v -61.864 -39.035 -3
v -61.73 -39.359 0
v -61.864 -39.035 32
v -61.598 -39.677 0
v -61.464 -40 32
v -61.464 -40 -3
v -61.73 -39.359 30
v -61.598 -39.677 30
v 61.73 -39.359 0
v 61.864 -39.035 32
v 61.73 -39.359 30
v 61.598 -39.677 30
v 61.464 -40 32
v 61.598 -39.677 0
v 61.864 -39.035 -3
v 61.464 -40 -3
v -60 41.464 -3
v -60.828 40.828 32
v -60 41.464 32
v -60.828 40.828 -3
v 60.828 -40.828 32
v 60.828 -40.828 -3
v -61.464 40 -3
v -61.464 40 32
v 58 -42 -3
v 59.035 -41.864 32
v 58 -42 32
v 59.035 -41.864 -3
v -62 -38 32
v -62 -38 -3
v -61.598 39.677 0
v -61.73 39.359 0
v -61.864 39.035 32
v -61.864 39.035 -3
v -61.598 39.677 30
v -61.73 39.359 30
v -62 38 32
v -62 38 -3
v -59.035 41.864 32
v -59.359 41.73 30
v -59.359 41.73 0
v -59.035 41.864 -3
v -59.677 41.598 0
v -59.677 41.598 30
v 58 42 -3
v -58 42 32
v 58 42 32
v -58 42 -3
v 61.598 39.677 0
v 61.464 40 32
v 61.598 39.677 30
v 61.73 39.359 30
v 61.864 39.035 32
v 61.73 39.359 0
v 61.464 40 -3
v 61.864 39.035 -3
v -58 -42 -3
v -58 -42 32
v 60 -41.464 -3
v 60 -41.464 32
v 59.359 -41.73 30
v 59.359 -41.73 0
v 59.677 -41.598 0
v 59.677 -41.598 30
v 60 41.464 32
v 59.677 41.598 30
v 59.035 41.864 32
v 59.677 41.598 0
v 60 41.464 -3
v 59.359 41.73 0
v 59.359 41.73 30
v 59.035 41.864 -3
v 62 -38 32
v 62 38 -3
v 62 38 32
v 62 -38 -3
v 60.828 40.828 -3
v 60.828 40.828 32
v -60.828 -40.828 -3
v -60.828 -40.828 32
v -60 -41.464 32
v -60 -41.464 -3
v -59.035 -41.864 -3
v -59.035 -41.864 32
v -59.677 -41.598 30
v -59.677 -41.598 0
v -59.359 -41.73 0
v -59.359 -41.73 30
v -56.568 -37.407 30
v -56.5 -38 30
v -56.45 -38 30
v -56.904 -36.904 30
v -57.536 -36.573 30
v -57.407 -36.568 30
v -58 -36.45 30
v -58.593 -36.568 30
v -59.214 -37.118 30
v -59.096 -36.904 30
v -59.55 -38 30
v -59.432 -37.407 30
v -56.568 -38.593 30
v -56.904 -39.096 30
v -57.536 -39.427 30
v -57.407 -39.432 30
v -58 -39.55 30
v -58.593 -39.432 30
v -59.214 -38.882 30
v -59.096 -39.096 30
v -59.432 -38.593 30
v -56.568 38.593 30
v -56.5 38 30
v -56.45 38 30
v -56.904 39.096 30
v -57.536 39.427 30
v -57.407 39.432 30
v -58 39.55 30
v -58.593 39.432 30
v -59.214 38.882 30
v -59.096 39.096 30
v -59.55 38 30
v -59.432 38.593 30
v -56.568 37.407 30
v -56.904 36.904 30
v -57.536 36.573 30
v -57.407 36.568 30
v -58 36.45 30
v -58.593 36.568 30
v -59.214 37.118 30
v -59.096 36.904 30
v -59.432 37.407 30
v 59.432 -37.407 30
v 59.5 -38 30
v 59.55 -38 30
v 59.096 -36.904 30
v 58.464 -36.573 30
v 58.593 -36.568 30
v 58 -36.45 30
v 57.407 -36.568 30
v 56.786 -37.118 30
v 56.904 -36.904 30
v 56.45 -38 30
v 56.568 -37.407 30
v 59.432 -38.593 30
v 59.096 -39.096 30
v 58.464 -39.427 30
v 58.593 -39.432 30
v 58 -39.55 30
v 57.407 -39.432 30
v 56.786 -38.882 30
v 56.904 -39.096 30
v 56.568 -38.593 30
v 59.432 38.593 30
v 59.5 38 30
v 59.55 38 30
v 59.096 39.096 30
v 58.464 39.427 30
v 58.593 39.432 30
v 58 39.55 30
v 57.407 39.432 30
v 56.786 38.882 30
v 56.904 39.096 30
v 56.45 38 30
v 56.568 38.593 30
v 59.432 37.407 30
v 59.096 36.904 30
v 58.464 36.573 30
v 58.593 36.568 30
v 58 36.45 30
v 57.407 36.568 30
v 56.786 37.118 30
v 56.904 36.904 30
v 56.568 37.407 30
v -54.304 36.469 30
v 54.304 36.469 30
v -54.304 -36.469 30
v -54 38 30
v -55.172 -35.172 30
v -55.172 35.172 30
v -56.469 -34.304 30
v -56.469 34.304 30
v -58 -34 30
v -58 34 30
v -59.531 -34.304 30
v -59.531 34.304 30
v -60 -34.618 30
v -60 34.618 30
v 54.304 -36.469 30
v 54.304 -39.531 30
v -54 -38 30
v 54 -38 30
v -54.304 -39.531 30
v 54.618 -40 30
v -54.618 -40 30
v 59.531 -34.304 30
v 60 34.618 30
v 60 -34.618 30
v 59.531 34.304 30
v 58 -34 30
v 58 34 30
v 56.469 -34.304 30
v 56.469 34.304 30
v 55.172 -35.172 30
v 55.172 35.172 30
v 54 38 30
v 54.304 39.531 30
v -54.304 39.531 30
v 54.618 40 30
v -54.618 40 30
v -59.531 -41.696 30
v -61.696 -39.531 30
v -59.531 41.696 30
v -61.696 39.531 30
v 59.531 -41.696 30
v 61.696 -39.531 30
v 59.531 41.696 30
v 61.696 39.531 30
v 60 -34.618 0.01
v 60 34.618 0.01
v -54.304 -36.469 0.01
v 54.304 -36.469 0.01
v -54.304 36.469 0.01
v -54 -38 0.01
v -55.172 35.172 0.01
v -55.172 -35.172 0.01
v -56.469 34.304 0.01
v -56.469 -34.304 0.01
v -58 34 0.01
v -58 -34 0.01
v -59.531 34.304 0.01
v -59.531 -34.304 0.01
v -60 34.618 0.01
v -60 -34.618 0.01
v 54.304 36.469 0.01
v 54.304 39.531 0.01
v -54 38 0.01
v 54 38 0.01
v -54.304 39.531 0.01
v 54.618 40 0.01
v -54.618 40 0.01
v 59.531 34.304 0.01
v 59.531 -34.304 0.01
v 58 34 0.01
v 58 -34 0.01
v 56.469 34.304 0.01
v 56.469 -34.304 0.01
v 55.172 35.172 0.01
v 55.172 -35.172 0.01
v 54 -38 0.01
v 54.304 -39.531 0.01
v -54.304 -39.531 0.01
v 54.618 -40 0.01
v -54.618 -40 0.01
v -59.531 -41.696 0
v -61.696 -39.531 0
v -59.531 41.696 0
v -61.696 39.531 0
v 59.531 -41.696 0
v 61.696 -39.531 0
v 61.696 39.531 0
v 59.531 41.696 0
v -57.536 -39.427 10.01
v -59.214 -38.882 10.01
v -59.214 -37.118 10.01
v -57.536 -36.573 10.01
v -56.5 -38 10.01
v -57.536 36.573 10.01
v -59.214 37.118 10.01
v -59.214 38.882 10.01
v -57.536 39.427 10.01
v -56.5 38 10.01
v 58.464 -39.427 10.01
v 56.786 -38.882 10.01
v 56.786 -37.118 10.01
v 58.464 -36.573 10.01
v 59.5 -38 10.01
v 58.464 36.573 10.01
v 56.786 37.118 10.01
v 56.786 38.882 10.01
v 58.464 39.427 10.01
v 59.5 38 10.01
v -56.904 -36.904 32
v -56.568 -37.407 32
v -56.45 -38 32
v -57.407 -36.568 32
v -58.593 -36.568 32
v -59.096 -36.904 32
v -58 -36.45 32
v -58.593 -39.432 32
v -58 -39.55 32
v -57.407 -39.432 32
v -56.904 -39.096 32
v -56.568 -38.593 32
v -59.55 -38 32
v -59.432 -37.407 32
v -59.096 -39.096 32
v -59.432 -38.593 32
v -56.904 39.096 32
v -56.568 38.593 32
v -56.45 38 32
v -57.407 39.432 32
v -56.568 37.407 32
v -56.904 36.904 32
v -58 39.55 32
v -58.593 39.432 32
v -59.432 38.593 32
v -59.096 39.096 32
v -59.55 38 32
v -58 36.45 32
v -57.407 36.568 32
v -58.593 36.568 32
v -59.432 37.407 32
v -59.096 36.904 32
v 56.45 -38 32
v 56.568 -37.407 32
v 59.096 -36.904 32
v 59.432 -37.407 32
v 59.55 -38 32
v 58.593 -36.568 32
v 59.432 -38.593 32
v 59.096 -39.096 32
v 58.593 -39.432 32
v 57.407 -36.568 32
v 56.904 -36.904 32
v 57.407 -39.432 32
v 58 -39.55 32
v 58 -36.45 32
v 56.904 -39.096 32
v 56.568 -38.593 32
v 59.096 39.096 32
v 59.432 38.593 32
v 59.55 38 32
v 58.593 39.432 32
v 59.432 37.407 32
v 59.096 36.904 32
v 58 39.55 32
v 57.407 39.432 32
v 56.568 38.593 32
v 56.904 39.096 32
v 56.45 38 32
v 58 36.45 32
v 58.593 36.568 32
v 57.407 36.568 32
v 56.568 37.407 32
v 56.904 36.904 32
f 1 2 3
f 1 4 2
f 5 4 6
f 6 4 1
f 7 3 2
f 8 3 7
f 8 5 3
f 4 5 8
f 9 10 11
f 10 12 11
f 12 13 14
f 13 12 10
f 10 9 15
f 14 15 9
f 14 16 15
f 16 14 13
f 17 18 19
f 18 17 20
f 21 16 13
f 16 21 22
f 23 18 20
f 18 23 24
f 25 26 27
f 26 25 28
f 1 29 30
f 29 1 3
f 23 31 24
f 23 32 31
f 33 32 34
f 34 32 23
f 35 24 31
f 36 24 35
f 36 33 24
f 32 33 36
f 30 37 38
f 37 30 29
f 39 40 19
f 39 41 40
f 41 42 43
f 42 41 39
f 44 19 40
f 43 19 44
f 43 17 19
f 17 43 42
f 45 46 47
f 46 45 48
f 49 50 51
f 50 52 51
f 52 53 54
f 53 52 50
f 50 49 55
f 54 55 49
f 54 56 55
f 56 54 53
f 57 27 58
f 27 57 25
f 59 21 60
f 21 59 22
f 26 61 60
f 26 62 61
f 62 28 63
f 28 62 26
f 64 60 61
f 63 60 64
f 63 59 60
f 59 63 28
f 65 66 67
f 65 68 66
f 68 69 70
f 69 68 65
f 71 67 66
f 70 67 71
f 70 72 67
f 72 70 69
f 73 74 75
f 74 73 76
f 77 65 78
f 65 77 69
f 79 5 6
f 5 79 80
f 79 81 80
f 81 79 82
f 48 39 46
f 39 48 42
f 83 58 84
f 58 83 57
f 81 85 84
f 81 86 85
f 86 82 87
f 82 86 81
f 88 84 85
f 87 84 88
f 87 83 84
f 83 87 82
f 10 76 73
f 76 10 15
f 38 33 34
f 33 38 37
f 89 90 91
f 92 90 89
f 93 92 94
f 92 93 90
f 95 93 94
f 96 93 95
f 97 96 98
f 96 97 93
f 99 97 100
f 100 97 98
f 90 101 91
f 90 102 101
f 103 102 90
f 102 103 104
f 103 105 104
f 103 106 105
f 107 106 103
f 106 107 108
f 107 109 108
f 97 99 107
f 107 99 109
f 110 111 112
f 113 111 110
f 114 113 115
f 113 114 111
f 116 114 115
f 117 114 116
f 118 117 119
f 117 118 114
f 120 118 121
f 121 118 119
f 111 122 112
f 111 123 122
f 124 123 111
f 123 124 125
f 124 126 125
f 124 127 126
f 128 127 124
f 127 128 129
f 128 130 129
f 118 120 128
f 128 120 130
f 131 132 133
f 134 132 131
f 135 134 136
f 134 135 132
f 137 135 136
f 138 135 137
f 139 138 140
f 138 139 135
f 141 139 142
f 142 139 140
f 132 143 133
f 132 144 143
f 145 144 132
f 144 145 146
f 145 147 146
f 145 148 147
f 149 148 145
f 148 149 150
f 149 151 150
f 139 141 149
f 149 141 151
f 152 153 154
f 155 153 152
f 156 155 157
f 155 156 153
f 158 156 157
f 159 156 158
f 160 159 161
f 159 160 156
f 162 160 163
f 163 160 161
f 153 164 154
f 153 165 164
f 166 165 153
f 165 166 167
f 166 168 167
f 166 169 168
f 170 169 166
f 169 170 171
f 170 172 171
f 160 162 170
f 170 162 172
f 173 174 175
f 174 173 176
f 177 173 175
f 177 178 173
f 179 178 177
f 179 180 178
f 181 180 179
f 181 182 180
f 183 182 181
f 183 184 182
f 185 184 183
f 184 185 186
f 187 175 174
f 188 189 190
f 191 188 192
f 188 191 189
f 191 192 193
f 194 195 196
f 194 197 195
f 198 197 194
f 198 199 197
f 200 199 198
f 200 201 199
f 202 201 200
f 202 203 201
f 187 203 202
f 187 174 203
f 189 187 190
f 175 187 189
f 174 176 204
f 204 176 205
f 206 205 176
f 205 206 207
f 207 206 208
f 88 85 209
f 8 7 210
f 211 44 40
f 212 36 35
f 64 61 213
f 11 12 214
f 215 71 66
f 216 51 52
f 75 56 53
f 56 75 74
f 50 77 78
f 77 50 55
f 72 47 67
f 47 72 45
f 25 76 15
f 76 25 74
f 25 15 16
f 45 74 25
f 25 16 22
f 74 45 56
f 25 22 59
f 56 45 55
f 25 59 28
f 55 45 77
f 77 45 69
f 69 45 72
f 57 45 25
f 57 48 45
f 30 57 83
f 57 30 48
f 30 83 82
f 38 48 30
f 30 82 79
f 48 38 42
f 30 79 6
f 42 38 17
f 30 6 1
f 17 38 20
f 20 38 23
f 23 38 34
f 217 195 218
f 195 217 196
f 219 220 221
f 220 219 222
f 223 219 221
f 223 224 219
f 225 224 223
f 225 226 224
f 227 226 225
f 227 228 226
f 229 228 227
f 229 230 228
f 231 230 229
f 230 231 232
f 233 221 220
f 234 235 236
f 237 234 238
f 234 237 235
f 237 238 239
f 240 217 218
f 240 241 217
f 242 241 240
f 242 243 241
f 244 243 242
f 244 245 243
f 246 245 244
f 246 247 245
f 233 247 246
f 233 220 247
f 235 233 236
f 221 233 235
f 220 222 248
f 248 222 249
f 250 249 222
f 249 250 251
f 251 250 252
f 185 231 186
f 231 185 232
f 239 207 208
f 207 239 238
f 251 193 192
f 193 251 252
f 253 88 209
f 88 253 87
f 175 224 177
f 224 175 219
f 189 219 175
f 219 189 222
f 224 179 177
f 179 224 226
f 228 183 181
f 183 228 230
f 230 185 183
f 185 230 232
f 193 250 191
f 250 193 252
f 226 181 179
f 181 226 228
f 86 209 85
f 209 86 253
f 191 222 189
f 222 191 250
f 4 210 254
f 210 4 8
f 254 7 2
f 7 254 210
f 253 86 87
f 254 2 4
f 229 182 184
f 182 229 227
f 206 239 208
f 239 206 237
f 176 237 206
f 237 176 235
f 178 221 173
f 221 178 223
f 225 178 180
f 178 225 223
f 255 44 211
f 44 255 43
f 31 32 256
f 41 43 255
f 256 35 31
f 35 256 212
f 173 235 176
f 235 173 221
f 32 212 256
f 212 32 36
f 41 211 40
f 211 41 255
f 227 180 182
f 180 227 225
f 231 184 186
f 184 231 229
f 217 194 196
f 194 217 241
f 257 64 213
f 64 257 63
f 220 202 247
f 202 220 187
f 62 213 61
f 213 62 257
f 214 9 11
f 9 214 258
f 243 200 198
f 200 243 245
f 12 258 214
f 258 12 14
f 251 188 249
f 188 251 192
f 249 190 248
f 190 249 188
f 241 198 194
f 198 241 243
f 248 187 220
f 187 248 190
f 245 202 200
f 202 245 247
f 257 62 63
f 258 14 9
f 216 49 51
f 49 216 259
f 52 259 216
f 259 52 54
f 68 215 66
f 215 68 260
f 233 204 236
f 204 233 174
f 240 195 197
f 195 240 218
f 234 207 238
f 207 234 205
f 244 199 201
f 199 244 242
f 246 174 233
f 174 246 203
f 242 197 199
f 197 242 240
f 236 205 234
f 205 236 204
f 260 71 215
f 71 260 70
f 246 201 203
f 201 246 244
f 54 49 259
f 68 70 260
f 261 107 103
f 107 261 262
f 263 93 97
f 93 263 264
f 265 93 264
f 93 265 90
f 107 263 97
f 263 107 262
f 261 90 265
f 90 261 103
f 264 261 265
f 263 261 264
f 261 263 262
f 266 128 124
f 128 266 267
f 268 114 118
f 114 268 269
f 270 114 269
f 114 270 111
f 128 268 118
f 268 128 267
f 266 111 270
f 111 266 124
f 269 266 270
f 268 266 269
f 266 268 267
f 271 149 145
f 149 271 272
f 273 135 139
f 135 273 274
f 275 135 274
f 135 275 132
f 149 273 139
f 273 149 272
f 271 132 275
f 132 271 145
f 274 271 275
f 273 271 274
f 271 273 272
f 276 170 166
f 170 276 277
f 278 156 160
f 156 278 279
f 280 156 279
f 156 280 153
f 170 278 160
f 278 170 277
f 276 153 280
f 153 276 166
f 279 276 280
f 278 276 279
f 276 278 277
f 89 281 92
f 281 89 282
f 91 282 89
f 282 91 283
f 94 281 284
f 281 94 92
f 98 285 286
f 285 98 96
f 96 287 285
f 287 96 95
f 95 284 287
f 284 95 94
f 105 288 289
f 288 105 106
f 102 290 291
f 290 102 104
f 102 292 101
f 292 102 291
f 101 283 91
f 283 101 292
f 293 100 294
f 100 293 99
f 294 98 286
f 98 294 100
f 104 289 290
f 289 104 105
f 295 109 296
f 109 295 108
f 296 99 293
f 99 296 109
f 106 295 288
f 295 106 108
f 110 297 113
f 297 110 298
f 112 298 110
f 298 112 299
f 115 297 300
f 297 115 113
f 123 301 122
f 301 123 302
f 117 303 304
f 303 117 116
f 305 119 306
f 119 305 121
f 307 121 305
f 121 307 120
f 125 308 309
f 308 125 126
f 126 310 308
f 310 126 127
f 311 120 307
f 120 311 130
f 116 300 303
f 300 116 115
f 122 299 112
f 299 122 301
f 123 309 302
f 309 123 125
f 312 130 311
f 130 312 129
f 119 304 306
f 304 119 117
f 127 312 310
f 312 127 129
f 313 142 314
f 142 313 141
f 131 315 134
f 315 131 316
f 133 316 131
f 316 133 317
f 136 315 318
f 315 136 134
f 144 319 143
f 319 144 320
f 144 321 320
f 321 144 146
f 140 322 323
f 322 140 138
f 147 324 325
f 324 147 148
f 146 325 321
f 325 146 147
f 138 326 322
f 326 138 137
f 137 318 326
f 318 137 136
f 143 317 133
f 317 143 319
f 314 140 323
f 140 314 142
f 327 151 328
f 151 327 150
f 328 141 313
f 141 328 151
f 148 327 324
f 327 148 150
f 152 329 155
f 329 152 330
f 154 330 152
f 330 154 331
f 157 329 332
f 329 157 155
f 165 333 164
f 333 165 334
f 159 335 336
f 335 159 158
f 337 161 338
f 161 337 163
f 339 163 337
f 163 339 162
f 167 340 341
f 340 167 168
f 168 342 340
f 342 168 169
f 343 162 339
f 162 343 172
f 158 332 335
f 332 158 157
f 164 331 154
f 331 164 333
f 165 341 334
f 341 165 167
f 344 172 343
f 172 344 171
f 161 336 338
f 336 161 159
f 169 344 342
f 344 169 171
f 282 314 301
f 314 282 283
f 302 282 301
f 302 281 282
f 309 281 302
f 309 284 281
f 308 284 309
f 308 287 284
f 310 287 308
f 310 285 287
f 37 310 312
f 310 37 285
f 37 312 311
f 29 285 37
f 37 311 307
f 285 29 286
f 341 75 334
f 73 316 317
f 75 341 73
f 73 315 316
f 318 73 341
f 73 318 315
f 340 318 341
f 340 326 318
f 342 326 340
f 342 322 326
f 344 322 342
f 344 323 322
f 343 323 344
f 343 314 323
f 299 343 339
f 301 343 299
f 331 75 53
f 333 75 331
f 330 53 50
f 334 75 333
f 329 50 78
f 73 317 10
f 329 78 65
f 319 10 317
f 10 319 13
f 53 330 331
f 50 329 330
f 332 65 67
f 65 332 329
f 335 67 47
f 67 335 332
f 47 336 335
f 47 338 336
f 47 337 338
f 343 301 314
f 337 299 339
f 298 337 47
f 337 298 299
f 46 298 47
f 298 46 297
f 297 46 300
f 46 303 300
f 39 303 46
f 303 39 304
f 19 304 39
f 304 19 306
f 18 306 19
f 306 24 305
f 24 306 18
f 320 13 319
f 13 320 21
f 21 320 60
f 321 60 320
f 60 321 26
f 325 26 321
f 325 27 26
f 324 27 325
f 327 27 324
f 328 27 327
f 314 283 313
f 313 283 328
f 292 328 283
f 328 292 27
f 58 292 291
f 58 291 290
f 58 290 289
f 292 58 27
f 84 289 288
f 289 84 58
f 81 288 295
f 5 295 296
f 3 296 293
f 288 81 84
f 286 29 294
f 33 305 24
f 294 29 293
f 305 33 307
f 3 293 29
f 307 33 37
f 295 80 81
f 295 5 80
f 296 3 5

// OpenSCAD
module ThatBox_Layout(dims, corner_radius) {
  dx = (dims[0] / 2) - corner_radius;
  dy = (dims[1] / 2) - corner_radius;

  for(x = [-dx, dx]) {
    for(y = [-dy, dy]) {
      translate([x, y]) {
        children();
      }
    }
  }
}

module ThatBox_Plate(dims, thickness, corner_radius) {
  hull() {
    ThatBox_Layout(dims, corner_radius) {
      cylinder(h = thickness, r = corner_radius, $fn = 24);
    }
  }
}

function PlateSize(inner, wall_thickness) = [inner[0] + (wall_thickness * 2), inner[1] + (wall_thickness * 2)];

module ThatBox_Box(
  inner = [120, 80, 30],
  wall_thickness = 2,
  corner_radius = 4,
  mounting_hole_diameter = 3,
  mounting_hole_depth = 20,
  base_thickness = 3,
) {
  plate_size = PlateSize(inner, wall_thickness);

  difference() {
    // Outer volume
    translate([0, 0, -base_thickness]) {
      ThatBox_Plate(dims = plate_size, thickness = inner[2] + base_thickness, corner_radius = corner_radius);
    }

    // Inner volume
    translate([0, 0, (inner[2] / 2) + 0.01]) {
      cube(inner, center = true);
    }
  }

  difference() {
    // Mounting hole supports
    ThatBox_Layout(dims = plate_size, corner_radius = corner_radius) {
      cylinder(h = inner[2], r = corner_radius, $fn = 16);
    }

    // Mounting holes
    ThatBox_Layout(dims = plate_size, corner_radius = corner_radius) {
      translate([0, 0, inner[2] - mounting_hole_depth + 0.01]) {
        cylinder(h = mounting_hole_depth, d = mounting_hole_diameter, $fn = 5);
      }
    }
  }
}

module ThatBox_Lid(
  inner = [120, 80, 30],
  wall_thickness = 2,
  corner_radius = 4,
  mounting_hole_diameter = 3.1,
  lid_thickness = 2,
) {
  plate_size = PlateSize(inner, wall_thickness);

  difference() {
    // Panel
    ThatBox_Plate(dims = plate_size, thickness = lid_thickness, corner_radius = corner_radius);

    // Mounting holes
    ThatBox_Layout(dims = plate_size, corner_radius = corner_radius) {
      translate([0, 0, -1]) {
        cylinder(h = lid_thickness + 2, d = mounting_hole_diameter, $fn = 16);
      }
    }
  }
}

// Demo
color("red") {
  ThatBox_Box();
}
translate([0, 0, 30]) {
  color("blue", 0.5) {
    ThatBox_Lid();
  }
}
